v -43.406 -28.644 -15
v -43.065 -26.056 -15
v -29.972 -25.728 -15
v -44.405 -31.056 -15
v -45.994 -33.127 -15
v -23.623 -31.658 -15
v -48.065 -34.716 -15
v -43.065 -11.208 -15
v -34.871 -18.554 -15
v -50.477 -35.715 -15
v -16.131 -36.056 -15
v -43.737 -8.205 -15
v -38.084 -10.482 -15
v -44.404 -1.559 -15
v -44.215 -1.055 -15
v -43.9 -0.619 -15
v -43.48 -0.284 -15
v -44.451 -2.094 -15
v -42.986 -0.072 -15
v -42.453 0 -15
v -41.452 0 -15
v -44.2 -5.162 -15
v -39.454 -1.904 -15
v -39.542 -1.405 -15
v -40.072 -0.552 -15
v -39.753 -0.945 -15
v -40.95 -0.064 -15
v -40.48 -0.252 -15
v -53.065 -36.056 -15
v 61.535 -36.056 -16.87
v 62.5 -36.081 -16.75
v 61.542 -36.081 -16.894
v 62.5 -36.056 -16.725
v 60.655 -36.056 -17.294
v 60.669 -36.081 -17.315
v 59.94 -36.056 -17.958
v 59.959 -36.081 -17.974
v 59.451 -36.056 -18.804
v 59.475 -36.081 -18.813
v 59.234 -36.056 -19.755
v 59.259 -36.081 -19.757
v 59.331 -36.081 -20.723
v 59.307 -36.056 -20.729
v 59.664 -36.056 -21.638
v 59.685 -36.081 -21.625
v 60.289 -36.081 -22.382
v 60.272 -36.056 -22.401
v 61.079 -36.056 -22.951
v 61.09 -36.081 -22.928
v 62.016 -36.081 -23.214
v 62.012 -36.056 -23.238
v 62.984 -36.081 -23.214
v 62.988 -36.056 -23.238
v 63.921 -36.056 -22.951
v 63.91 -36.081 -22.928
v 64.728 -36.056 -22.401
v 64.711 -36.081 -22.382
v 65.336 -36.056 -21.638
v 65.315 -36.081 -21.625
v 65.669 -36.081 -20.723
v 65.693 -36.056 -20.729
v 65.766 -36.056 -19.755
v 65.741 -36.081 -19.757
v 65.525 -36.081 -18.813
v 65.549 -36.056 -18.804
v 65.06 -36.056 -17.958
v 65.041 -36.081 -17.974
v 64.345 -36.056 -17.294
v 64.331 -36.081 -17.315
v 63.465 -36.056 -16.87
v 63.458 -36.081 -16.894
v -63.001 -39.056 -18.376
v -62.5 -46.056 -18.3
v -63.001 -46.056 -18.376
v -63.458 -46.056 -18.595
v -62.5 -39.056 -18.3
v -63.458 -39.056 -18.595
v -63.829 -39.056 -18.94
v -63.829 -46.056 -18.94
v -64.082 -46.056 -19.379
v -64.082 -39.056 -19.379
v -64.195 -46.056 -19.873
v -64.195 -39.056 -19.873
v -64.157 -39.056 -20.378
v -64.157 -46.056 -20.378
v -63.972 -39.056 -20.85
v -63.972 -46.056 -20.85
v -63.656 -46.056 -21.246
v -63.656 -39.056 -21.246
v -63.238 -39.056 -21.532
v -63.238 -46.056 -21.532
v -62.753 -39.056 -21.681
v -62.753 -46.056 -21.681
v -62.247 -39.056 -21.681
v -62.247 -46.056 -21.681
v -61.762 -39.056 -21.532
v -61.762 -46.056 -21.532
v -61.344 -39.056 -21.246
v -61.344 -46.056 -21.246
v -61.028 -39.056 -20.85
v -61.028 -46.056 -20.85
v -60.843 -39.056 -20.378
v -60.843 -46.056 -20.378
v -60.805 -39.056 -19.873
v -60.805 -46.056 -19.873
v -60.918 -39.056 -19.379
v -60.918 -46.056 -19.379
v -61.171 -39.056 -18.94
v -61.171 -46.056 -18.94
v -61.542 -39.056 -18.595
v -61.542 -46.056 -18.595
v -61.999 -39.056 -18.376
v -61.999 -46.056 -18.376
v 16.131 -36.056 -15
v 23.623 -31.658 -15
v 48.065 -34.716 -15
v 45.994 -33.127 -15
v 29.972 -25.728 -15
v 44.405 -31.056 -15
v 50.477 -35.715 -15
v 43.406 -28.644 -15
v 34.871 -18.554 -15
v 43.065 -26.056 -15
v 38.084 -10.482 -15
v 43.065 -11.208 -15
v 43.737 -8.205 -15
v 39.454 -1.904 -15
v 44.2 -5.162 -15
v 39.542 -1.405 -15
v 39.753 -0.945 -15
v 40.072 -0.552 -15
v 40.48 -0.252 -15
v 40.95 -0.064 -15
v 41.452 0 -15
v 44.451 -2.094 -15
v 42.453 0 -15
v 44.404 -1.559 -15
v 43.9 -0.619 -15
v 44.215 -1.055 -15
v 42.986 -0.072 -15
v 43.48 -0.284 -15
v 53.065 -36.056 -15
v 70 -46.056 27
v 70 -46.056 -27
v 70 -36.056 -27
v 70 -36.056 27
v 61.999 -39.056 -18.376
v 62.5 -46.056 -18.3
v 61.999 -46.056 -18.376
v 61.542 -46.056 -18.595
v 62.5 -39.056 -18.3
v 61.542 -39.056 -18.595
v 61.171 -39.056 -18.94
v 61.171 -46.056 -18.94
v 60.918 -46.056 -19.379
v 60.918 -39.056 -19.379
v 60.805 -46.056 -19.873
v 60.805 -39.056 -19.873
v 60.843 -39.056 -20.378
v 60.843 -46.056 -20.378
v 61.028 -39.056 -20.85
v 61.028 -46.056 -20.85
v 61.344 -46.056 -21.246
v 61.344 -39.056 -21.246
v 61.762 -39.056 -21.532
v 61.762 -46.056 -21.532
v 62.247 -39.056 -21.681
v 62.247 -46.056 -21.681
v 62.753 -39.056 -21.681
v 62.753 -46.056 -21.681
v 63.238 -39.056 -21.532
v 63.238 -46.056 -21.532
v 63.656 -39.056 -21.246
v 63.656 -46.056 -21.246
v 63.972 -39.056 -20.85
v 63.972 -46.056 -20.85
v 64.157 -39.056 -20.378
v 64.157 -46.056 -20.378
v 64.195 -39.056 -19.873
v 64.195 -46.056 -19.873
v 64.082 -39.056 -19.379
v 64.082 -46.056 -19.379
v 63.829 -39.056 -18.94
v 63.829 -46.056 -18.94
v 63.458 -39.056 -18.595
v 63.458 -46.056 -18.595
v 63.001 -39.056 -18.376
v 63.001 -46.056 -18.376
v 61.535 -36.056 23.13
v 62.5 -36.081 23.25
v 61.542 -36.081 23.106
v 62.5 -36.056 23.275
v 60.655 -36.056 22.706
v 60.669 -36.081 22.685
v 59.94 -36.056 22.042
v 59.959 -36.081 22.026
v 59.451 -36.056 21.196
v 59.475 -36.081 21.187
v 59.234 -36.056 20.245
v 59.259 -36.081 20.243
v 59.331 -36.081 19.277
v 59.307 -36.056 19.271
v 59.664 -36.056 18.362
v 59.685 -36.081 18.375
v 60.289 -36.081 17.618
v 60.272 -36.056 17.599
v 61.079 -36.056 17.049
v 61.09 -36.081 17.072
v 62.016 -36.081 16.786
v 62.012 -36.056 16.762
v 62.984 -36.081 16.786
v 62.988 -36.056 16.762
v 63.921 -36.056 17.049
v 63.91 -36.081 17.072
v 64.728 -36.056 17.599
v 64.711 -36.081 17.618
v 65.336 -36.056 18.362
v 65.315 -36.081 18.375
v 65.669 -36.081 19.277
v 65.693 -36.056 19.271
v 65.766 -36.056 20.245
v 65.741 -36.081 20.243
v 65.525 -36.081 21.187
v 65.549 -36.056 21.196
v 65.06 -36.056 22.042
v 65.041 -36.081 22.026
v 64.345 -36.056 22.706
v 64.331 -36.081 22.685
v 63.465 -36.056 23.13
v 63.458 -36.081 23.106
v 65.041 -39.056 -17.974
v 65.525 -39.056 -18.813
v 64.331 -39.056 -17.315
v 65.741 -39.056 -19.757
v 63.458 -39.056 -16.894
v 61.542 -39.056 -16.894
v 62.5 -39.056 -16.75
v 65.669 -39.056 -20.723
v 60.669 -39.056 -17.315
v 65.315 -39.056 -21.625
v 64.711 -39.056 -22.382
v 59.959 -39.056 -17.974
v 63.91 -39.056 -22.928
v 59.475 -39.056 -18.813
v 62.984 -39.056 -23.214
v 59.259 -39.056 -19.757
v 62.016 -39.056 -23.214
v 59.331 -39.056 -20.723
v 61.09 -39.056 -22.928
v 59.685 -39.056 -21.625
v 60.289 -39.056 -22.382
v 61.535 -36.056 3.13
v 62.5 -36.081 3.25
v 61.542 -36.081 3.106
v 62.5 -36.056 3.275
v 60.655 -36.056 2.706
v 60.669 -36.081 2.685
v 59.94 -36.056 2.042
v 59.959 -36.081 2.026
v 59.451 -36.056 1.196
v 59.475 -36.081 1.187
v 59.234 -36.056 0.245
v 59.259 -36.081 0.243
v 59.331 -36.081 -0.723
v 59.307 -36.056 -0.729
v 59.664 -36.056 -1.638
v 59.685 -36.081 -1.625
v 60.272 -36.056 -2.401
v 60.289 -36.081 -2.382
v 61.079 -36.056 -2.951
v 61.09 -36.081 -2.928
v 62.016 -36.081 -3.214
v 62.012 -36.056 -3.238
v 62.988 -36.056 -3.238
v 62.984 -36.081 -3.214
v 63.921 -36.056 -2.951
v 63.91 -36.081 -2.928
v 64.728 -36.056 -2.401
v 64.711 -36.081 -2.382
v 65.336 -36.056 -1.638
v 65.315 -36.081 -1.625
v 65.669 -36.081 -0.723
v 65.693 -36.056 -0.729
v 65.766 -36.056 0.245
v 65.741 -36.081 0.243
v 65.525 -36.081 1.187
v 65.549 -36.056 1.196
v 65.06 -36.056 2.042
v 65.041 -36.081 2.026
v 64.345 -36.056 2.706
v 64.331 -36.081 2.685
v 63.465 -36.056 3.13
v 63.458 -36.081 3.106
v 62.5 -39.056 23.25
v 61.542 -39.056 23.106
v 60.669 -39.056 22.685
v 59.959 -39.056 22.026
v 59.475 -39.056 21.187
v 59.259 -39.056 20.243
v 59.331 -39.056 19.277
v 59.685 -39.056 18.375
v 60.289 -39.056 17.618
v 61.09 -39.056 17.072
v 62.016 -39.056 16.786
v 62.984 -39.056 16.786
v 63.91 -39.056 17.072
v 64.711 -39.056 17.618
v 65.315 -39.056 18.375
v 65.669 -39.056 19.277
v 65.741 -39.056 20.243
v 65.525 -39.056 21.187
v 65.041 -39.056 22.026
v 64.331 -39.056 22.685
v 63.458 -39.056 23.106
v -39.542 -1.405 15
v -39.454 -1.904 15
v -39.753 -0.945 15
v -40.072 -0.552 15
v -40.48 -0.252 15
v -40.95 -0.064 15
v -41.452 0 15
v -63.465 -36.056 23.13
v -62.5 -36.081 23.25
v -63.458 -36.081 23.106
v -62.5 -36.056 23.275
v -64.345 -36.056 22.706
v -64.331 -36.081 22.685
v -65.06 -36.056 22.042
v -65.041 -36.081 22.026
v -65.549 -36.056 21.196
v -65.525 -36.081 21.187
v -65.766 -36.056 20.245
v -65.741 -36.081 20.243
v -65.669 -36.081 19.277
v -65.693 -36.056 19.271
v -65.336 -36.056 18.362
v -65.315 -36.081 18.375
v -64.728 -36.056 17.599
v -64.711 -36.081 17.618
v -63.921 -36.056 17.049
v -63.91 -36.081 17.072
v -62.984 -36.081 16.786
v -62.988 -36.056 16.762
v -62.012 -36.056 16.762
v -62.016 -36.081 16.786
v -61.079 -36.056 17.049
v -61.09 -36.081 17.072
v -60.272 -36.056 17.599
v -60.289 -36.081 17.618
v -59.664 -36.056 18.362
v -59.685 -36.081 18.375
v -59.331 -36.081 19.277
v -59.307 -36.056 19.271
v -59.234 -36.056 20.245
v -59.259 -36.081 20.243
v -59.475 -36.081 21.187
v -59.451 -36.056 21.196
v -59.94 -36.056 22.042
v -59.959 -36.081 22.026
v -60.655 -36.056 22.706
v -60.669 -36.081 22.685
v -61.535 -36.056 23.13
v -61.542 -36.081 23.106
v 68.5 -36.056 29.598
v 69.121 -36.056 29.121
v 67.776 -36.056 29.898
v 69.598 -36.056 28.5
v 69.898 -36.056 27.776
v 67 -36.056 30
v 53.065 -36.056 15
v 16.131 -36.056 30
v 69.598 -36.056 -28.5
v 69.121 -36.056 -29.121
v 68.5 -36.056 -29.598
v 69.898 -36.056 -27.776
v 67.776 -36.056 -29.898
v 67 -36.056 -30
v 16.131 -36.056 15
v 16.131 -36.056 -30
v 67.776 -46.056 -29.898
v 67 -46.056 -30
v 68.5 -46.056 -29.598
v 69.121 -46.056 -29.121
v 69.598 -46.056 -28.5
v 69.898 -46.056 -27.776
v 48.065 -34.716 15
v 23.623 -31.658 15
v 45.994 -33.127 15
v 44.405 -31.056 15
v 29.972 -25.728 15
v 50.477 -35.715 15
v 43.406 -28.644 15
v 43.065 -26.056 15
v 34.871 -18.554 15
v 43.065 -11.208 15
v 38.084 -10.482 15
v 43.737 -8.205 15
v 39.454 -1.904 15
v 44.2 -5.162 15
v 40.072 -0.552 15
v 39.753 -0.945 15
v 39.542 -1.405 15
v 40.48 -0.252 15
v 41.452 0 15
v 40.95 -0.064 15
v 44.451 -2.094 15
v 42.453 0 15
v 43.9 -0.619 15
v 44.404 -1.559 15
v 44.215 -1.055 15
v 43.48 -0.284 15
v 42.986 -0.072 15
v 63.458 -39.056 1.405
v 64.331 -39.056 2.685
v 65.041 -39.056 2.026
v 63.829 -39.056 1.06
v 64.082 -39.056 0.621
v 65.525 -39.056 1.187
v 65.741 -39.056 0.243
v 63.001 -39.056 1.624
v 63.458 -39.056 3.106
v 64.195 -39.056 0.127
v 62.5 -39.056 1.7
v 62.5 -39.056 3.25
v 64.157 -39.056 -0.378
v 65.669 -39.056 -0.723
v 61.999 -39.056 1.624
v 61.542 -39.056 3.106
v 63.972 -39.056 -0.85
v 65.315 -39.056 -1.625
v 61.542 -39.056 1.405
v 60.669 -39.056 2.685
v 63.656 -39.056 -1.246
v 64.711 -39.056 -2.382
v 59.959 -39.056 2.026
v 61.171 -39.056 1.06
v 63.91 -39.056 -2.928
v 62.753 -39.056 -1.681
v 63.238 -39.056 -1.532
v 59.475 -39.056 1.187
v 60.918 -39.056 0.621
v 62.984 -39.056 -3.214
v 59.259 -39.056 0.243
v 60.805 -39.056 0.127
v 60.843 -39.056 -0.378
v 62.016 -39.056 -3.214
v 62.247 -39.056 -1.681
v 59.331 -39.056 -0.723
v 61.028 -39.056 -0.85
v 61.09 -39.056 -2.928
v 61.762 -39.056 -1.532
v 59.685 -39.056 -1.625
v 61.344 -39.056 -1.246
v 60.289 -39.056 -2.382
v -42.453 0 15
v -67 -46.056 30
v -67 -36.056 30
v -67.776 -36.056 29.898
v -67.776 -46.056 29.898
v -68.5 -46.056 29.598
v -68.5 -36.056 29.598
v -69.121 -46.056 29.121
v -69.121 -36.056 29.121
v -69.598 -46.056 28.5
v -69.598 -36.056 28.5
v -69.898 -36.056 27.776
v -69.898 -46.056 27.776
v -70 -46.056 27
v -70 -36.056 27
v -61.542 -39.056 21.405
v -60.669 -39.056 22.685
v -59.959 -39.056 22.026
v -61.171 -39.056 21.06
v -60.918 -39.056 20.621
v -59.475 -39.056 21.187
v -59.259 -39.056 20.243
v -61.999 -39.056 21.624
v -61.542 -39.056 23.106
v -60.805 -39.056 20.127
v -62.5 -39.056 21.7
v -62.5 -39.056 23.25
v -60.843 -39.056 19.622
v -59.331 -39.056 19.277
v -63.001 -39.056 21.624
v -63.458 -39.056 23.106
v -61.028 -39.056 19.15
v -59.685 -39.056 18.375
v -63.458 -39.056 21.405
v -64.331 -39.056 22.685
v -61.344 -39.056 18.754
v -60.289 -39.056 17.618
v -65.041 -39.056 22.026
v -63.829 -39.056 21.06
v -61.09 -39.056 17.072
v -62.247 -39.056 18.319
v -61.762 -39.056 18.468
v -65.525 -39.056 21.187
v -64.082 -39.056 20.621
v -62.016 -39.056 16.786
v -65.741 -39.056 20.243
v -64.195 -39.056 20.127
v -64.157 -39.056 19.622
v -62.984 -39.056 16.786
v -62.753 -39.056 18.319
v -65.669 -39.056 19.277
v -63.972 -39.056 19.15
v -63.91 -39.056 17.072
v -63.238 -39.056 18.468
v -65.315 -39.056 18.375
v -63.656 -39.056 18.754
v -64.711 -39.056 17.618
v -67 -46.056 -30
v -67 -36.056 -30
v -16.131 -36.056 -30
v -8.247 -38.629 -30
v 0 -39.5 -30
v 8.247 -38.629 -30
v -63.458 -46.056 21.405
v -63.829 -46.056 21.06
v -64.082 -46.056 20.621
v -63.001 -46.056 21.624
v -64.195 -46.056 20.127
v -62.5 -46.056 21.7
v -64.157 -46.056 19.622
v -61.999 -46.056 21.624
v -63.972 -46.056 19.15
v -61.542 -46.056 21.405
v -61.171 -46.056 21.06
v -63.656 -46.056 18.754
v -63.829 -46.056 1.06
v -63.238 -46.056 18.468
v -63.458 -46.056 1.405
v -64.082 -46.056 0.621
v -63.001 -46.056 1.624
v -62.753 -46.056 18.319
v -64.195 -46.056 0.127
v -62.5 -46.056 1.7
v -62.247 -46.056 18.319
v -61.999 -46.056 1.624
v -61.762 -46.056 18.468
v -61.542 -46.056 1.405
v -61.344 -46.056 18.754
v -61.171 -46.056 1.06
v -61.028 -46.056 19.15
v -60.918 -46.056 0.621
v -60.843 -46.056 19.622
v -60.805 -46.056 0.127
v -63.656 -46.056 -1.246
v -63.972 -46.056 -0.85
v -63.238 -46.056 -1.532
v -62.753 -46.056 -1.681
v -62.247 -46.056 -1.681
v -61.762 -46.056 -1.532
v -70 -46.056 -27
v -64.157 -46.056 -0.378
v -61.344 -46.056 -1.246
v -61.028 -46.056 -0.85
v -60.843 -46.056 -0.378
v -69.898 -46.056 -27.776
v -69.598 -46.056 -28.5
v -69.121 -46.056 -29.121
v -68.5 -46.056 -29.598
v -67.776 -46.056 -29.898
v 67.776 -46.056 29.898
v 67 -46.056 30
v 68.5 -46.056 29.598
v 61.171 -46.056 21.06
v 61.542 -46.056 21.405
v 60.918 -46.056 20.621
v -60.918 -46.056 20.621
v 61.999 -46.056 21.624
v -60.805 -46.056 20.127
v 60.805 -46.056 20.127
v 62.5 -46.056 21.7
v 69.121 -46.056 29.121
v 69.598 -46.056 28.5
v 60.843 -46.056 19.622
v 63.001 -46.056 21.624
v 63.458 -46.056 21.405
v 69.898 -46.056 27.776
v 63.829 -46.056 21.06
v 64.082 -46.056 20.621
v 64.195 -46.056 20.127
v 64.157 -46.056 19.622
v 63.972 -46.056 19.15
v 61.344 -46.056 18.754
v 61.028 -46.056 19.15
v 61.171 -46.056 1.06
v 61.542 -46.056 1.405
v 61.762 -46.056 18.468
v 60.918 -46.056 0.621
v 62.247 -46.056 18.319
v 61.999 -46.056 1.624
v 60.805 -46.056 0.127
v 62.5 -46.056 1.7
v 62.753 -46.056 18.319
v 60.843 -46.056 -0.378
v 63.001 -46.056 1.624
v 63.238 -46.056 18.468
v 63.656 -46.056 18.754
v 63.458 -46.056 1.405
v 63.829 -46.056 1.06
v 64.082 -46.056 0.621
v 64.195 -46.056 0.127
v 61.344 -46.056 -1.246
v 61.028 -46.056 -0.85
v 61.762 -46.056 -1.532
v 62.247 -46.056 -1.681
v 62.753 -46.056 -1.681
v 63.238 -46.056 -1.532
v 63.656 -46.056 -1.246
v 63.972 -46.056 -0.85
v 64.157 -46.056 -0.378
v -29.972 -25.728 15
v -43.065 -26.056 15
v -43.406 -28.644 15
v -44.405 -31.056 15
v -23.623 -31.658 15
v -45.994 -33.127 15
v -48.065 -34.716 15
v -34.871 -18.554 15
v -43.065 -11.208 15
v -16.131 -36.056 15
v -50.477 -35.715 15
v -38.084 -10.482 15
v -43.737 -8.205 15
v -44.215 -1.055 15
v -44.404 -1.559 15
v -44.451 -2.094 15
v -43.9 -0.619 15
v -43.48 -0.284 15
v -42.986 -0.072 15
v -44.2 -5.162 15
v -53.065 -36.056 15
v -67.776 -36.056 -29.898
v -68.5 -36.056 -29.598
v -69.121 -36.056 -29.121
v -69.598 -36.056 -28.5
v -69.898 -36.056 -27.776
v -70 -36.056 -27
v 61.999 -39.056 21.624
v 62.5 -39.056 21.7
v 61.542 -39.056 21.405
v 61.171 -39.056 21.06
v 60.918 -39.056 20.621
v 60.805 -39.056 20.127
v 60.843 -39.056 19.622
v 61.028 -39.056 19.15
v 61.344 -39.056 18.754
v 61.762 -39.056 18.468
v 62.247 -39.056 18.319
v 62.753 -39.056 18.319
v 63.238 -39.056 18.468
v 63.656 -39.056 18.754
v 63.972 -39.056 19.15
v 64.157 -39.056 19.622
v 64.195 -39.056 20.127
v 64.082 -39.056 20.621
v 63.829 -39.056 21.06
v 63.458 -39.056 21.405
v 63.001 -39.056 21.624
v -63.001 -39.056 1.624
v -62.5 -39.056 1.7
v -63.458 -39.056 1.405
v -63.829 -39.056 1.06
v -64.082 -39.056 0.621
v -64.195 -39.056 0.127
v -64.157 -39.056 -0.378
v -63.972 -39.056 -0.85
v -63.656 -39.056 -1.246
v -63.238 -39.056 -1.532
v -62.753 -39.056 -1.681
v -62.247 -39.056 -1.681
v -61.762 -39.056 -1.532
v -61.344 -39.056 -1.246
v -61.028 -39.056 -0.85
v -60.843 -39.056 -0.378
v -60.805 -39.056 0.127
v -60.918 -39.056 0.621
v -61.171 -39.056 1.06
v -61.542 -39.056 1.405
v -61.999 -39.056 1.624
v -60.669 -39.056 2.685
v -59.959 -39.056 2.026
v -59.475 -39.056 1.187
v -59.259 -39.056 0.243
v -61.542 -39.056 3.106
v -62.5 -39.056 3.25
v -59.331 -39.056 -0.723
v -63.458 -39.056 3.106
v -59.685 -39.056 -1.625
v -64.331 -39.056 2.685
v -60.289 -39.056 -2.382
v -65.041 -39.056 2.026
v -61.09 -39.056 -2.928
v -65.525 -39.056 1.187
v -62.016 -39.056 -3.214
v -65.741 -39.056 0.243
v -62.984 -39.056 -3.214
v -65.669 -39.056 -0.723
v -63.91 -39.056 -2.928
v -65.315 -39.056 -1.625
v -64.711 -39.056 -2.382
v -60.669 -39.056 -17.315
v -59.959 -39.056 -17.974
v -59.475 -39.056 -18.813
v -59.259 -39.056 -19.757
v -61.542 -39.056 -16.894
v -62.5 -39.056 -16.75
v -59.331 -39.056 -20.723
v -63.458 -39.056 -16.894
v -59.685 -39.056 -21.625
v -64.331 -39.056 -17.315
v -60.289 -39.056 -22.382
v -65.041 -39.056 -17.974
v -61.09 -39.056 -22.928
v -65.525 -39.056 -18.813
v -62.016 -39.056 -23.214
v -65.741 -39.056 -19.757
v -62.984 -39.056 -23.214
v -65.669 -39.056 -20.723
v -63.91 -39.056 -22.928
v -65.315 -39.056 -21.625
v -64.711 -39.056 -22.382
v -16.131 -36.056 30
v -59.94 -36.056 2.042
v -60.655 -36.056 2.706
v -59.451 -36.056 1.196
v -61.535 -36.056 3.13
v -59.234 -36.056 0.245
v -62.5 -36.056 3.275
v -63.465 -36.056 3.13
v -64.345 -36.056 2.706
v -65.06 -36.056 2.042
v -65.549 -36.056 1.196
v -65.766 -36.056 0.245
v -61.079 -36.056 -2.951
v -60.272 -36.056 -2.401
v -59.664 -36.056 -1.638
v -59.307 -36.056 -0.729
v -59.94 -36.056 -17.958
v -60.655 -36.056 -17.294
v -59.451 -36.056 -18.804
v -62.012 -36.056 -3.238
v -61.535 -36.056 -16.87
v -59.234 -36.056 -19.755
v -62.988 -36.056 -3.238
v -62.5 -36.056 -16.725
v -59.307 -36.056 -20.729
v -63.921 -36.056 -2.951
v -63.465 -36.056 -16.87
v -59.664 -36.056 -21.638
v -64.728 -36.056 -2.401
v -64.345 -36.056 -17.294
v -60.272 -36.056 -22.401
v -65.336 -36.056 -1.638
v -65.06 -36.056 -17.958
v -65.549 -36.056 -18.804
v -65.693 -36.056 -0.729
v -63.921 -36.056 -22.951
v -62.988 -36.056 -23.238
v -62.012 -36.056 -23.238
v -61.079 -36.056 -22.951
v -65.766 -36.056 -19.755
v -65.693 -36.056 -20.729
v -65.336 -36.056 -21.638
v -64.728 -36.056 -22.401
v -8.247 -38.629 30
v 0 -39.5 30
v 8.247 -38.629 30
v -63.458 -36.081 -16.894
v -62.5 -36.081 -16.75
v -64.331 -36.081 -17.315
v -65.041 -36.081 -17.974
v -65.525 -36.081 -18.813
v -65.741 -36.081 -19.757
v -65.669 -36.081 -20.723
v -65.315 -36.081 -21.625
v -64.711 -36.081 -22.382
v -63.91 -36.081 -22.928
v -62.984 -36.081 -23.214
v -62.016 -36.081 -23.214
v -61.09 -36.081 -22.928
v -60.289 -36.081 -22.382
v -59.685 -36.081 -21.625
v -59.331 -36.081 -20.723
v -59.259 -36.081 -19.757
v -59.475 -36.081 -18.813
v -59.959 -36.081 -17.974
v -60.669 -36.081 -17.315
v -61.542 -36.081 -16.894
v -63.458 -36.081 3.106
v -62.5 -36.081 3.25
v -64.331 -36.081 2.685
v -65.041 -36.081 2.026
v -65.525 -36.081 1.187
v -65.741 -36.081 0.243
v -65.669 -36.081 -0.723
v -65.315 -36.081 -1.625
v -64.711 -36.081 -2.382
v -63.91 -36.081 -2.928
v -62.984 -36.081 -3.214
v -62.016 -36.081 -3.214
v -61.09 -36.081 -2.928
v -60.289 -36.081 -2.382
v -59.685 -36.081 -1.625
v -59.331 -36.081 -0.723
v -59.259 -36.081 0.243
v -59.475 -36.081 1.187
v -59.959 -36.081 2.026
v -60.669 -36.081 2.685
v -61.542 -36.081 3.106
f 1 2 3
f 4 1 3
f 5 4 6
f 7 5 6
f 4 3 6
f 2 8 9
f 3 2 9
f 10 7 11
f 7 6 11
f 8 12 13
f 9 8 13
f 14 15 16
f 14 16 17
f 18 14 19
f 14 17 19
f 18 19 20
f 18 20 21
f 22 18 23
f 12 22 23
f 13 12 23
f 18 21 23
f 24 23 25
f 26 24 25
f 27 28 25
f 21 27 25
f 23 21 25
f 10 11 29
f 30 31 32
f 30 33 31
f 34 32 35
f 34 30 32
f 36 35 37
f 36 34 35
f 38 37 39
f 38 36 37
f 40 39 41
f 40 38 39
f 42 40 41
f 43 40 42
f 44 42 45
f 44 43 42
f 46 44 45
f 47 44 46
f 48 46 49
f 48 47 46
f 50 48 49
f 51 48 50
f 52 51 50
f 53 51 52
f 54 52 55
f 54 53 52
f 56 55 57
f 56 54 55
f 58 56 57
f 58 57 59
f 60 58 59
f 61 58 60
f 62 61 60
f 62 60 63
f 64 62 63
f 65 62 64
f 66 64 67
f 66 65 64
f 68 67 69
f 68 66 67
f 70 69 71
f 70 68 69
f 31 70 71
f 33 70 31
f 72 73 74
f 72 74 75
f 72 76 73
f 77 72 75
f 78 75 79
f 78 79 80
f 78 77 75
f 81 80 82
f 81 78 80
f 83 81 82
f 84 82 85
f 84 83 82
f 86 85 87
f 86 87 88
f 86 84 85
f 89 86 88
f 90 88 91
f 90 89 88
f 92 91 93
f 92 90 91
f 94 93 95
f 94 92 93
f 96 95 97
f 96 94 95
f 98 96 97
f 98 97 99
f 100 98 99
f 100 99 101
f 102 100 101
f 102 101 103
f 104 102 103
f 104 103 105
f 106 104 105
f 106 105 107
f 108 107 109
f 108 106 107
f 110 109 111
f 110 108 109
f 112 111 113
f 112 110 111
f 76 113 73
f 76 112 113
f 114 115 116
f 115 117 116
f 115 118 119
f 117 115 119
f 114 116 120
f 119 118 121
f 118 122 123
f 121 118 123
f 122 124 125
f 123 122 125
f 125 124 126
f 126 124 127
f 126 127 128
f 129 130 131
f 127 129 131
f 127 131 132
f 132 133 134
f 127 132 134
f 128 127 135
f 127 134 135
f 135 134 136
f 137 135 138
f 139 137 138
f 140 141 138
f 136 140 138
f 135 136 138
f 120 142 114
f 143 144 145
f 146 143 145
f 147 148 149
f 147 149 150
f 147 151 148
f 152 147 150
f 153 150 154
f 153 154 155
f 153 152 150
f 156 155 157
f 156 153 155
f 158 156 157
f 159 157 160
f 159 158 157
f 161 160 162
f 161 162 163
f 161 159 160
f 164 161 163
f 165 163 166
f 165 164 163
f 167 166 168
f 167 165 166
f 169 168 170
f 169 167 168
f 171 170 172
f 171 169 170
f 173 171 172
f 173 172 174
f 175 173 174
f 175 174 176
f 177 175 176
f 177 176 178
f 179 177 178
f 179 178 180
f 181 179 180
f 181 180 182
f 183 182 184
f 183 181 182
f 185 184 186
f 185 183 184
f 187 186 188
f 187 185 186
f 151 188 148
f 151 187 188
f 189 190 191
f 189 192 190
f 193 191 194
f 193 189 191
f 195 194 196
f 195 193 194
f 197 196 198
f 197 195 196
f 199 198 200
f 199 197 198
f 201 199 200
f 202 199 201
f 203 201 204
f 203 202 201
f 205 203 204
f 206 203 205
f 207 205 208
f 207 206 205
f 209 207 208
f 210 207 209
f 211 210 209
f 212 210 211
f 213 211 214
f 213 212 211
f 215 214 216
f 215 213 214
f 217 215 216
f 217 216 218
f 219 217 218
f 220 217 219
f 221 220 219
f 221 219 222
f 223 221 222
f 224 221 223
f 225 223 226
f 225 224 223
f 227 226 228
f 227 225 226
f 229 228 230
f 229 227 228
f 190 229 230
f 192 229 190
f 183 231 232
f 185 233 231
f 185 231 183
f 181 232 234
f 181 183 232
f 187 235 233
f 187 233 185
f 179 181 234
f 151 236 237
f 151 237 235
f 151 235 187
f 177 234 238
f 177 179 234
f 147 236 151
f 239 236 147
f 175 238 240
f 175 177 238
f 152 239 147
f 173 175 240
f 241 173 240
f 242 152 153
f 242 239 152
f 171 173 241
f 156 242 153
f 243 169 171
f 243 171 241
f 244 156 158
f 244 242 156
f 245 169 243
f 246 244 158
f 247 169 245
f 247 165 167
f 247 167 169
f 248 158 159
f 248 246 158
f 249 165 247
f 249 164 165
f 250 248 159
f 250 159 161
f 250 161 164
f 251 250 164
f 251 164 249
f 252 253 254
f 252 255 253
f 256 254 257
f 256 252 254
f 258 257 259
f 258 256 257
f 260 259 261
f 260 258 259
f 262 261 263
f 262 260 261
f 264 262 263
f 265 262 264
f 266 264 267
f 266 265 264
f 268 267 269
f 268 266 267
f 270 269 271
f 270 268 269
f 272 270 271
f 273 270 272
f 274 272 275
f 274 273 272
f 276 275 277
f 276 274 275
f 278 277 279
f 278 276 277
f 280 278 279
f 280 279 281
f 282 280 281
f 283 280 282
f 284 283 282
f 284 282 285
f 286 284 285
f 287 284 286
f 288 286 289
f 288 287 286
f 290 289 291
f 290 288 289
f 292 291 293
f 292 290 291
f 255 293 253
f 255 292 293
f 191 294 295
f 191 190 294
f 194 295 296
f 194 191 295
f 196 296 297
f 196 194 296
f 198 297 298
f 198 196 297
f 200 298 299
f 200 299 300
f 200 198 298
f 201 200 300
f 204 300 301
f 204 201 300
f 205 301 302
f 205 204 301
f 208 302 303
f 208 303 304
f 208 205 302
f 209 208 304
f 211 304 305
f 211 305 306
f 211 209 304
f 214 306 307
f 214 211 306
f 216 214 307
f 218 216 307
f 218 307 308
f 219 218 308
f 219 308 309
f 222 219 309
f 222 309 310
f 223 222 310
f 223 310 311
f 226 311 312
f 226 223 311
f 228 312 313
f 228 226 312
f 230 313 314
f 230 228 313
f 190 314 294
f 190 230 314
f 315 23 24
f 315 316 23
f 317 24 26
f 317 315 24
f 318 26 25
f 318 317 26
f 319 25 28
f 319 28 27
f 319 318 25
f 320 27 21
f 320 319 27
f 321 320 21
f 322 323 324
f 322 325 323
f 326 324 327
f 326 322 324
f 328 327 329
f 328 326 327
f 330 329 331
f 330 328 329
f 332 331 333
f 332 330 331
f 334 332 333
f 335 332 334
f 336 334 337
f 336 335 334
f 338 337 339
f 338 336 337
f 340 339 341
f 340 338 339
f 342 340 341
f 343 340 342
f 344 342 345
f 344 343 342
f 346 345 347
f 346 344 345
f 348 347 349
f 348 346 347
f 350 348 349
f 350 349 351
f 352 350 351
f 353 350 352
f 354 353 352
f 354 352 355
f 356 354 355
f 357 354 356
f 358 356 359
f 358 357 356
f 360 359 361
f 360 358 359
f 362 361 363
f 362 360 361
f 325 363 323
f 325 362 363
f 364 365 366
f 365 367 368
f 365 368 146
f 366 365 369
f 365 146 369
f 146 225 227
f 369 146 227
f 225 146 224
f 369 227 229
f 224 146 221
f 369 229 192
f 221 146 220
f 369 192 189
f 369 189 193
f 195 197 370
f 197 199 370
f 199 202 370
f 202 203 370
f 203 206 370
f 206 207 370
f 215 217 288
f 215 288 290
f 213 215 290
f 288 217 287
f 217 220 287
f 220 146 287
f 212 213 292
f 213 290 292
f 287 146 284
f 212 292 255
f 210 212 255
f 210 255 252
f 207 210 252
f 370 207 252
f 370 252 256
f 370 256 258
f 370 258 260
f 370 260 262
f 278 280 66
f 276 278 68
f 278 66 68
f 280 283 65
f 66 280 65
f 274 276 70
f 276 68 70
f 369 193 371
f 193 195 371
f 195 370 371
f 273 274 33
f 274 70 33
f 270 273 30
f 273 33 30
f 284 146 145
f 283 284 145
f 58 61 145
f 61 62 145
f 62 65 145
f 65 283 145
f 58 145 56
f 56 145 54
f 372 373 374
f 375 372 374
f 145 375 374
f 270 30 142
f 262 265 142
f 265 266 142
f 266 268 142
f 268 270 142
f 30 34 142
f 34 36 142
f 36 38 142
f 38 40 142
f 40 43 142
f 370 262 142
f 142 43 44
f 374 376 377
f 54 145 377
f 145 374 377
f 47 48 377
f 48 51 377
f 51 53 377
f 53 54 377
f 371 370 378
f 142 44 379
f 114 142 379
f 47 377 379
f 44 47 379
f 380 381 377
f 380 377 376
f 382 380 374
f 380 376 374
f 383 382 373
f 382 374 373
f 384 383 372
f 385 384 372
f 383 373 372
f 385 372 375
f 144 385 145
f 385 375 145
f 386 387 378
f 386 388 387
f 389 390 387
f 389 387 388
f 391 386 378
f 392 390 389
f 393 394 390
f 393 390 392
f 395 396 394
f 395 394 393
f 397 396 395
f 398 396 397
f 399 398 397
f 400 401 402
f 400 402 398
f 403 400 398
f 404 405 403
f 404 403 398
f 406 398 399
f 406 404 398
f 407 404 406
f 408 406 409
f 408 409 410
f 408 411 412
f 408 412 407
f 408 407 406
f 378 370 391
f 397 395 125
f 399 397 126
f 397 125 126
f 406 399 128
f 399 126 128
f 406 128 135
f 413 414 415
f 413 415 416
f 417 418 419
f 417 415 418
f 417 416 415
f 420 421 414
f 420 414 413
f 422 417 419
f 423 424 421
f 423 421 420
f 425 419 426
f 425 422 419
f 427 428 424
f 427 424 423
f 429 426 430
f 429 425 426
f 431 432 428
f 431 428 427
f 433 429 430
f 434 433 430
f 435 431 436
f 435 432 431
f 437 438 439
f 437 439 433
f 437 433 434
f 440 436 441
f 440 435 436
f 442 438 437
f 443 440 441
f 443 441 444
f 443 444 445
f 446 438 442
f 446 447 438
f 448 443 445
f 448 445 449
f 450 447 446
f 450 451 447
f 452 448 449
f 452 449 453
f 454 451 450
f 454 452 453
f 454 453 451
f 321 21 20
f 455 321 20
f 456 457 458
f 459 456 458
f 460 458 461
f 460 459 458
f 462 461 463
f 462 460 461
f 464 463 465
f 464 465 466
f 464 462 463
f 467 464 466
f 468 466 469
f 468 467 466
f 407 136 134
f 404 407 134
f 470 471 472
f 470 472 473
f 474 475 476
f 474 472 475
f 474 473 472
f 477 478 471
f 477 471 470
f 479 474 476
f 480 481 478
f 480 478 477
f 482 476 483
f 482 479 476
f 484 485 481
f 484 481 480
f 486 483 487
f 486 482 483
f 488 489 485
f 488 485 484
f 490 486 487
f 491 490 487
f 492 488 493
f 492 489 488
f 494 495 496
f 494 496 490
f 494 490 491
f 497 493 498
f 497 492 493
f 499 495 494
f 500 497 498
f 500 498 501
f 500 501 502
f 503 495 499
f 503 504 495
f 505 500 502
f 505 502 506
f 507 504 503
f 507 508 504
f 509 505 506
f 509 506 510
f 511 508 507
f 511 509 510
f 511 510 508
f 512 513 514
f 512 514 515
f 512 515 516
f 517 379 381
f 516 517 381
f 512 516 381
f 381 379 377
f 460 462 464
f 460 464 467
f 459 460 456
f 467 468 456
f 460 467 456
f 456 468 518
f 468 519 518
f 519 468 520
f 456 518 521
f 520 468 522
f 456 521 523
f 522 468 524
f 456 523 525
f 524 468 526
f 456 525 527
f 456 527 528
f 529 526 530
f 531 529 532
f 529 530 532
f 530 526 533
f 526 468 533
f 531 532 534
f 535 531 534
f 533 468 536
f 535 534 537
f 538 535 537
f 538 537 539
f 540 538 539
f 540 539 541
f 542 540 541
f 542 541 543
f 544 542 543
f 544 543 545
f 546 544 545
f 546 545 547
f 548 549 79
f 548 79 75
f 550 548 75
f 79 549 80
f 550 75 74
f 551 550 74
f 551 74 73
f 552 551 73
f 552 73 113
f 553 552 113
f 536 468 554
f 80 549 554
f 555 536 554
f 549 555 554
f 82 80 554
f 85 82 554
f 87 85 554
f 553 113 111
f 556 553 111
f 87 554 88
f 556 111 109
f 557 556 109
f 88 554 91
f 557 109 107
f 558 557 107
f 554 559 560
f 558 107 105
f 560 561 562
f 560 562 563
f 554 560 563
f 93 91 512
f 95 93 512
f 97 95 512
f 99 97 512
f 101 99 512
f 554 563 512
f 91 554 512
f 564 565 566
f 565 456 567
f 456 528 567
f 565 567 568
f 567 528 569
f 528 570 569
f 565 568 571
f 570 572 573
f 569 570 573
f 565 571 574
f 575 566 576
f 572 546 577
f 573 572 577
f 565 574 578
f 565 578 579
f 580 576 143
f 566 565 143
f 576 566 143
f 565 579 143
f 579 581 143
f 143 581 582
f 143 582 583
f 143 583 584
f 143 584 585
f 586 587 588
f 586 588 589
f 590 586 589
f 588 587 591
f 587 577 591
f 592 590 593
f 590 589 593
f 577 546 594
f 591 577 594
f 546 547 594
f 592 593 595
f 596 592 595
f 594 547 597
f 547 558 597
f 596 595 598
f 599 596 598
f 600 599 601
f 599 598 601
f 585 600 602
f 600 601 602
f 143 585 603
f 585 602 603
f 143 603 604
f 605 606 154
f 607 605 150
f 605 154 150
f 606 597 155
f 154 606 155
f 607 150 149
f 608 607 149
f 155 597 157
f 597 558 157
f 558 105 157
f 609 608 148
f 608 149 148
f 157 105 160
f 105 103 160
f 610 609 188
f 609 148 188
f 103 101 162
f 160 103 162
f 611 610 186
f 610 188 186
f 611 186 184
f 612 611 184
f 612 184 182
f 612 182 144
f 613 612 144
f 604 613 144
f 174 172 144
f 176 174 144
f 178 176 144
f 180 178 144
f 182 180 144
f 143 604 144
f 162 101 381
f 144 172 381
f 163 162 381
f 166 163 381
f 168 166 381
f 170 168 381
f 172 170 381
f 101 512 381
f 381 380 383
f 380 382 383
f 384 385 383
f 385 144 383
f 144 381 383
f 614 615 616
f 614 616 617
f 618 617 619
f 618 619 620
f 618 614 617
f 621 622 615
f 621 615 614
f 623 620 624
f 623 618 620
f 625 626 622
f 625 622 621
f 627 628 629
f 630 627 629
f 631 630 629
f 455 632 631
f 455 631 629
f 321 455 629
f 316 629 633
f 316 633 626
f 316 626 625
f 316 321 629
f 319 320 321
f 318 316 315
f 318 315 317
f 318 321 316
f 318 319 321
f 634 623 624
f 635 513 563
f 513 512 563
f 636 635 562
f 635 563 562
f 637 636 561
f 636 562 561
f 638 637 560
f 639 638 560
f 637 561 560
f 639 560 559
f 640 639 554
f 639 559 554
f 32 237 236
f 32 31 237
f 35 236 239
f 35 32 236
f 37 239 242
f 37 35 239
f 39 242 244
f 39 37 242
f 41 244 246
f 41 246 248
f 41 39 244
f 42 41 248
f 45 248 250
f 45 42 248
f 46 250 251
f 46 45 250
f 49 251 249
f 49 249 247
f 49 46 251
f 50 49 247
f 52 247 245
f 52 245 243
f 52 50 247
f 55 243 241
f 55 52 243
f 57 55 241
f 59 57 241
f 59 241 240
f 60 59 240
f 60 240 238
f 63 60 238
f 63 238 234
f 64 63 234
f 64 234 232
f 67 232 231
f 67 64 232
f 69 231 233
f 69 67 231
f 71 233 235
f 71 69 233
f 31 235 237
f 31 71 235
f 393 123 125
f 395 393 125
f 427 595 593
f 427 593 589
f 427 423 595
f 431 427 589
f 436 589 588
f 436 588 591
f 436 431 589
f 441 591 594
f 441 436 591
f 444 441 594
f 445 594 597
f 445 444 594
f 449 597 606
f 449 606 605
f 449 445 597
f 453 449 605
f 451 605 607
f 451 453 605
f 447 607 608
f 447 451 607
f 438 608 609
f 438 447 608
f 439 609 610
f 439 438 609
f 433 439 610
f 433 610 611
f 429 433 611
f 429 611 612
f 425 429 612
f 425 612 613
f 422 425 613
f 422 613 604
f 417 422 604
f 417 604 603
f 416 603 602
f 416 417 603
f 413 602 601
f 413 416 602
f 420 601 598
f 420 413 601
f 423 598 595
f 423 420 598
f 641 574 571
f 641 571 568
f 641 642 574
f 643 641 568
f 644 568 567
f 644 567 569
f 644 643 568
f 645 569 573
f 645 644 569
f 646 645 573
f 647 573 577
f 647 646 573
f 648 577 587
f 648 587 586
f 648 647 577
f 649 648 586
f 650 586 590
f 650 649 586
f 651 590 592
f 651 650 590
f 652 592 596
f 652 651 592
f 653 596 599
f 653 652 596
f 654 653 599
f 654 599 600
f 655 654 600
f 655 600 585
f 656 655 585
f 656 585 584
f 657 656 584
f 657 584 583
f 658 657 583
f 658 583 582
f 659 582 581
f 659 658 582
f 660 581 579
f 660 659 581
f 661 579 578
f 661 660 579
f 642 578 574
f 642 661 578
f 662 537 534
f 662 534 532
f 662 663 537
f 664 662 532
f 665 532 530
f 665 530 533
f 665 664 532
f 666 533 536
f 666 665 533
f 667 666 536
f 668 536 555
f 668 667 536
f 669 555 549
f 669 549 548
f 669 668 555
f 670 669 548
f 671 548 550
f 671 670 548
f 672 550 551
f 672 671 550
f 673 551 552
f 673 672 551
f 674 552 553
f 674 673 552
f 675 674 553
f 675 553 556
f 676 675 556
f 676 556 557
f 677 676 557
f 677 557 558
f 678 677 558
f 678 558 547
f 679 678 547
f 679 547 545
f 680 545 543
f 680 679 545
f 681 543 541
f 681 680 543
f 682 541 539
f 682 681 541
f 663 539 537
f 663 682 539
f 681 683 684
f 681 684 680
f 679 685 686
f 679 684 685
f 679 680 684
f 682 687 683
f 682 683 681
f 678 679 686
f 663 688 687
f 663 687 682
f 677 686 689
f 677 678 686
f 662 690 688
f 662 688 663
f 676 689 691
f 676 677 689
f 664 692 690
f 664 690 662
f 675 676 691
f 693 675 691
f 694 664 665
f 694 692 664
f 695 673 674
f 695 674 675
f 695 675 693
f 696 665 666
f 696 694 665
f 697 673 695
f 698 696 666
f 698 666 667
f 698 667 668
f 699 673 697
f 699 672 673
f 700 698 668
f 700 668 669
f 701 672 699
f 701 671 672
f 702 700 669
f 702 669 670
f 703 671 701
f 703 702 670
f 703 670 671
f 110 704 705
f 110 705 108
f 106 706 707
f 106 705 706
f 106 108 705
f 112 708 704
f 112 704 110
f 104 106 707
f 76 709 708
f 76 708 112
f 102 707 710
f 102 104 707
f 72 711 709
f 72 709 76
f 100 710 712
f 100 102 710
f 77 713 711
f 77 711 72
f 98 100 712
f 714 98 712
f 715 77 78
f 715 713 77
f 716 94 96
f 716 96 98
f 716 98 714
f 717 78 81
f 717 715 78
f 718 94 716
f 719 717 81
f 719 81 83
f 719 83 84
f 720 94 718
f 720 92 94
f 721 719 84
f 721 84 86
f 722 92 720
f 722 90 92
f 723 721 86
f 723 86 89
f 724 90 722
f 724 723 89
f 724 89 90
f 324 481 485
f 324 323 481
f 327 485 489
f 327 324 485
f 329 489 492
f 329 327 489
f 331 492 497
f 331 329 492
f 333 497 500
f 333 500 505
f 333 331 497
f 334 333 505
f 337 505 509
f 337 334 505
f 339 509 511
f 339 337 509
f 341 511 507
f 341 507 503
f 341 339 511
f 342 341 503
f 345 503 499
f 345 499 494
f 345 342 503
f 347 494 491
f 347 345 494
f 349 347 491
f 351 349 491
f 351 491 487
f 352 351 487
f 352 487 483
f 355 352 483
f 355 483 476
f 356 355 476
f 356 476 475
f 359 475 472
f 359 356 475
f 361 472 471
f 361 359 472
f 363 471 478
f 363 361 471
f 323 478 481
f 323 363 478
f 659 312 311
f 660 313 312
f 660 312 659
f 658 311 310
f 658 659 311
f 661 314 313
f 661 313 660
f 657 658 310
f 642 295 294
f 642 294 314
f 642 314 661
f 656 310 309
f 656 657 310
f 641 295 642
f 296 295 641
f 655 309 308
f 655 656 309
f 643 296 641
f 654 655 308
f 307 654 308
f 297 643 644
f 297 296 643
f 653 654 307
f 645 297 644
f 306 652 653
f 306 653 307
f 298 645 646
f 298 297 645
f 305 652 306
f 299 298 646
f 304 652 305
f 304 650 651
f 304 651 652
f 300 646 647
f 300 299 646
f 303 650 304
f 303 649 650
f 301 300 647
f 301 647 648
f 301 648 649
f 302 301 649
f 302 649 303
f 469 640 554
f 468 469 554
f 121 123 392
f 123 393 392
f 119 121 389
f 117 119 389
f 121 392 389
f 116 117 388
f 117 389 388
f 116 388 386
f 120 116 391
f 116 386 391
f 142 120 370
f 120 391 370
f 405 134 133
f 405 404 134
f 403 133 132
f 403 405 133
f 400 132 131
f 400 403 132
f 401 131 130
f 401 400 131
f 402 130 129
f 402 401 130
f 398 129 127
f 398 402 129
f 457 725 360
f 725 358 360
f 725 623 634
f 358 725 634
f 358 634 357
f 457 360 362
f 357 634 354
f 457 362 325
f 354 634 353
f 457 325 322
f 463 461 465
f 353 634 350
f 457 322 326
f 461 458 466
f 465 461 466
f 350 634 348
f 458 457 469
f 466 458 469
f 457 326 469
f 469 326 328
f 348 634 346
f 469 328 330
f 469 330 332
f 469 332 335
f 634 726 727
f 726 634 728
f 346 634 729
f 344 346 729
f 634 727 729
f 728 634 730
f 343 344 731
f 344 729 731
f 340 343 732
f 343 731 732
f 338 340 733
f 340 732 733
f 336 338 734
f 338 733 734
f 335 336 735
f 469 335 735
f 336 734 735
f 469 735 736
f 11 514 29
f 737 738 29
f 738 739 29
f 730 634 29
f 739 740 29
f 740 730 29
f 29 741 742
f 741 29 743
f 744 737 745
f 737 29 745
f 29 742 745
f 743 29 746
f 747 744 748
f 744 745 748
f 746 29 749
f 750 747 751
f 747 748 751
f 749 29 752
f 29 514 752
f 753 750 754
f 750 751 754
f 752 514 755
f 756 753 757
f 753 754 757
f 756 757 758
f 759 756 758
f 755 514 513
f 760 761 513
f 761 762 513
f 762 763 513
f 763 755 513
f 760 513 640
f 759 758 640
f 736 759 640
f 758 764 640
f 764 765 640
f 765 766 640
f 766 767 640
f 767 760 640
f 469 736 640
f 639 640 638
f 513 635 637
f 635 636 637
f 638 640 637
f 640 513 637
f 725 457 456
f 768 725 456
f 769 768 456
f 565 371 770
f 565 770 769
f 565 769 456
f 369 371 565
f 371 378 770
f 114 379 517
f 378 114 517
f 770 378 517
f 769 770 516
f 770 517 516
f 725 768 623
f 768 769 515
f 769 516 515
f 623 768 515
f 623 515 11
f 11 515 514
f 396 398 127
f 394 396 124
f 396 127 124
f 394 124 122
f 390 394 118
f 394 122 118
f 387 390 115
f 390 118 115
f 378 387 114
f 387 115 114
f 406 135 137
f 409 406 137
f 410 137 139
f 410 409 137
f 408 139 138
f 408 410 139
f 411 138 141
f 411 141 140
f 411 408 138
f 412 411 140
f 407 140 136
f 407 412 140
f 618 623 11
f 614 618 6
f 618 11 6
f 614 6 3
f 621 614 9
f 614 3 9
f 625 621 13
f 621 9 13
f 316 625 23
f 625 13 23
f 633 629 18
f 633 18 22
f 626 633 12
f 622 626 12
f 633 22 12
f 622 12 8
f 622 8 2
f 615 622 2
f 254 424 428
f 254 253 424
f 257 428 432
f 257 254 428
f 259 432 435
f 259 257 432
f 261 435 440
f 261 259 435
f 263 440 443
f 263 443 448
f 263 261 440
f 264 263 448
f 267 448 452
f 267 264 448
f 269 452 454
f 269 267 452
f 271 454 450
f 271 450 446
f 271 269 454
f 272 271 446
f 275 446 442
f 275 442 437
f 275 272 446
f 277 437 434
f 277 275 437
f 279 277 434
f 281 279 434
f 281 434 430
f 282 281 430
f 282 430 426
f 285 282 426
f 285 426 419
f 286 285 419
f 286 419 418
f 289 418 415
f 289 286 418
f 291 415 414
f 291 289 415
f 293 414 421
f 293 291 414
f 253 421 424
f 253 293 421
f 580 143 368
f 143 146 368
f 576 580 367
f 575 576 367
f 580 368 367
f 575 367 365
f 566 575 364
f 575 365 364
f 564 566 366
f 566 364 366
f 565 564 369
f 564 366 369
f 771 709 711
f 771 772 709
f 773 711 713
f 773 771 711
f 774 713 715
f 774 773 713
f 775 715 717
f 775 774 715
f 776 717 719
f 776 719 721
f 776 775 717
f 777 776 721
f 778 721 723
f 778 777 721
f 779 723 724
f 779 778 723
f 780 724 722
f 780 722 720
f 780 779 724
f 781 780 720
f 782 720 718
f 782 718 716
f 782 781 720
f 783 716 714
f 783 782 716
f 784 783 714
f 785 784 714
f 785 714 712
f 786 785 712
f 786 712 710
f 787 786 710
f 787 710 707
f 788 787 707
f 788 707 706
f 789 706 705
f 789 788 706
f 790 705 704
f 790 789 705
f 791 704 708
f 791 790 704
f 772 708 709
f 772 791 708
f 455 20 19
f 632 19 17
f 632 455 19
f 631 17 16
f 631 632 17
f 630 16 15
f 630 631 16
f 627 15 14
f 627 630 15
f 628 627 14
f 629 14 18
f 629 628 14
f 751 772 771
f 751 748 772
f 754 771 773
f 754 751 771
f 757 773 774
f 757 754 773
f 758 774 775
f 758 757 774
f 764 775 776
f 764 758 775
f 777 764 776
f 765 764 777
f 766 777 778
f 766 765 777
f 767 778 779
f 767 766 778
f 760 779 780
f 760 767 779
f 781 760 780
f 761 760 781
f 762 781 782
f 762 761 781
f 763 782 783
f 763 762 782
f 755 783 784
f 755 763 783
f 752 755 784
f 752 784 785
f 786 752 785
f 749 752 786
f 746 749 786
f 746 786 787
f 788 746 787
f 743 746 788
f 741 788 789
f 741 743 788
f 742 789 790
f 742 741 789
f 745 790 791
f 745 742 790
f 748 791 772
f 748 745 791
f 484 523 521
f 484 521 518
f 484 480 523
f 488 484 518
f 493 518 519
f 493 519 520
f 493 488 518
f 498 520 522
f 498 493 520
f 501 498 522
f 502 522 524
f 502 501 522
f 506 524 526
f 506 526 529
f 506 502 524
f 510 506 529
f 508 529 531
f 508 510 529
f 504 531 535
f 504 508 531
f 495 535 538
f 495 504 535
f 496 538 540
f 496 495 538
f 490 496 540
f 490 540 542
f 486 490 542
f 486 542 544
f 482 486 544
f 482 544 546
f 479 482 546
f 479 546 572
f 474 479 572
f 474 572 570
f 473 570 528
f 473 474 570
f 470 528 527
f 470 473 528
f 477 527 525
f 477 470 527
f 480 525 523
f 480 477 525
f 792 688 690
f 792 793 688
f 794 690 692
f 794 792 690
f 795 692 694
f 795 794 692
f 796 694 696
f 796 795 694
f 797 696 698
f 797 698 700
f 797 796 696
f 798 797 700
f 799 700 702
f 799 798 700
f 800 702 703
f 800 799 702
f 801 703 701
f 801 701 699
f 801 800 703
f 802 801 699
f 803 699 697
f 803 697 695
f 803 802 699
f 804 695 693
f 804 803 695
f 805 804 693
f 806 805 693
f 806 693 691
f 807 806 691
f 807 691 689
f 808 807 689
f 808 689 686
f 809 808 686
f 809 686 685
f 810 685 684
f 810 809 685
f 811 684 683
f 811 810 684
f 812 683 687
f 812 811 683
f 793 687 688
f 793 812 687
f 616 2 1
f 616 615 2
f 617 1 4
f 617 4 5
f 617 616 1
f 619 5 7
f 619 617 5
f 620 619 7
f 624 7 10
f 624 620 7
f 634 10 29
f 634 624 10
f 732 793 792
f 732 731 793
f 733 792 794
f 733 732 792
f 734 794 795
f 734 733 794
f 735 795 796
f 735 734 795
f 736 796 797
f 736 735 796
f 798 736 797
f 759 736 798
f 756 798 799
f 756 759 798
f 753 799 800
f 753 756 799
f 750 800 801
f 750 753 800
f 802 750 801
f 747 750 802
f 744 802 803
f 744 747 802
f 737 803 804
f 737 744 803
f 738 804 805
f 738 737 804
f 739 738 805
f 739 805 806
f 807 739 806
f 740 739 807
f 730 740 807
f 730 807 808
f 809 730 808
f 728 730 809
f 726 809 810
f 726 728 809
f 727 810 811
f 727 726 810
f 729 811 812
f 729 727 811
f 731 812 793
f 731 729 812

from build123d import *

# Parameters (mm, degrees)
BOSS_EXTRUDE3_DEPTH           = 30
BOSS_EXTRUDE3_DEPTH_BACK      = 30
BOSS_EXTRUDE4_DEPTH           = 15
BOSS_EXTRUDE4_DEPTH_BACK      = 15
BOSS_EXTRUDE5_DEPTH           = 15
BOSS_EXTRUDE5_DEPTH_BACK      = 15
FILLET1_R                     = 10
CBORE_FOR_M3_SHCS1_AT_2_COUNT = 2
CBORE_FOR_M3_SHCS1_AT_2_PITCH = 125
LPATTERN1_COUNT               = 2
LPATTERN1_PITCH               = 20
LPATTERN1_COL_COUNT           = 2
LPATTERN1_COL_PITCH           = 20
FILLET2_R                     = 2
FILLET3_R                     = 3


with BuildPart() as part:
    # Sketch1 → Boss-Extrude3 (new, two sides: drawn at the far end of the back side and taken through both)
    with BuildSketch(Plane.XY.offset(-BOSS_EXTRUDE3_DEPTH_BACK)):
        with BuildLine():
            Line((-43.065388601, -36.056178761), (-70, -36.056178761))
            Line((-70, -36.056178761), (-70, -46.056178761))
            Line((-70, -46.056178761), (70, -46.056178761))
            Line((70, -46.056178761), (70, -36.056178761))
            Line((70, -36.056178761), (43.065388601, -36.056178761))
            Line((43.065388601, -36.056178761), (26.080681992, -36.056178761))
            Line((26.080681992, -36.056178761), (16.130777202, -36.056178761))
            ThreePointArc((16.130777202, -36.056178761), (0, -39.5), (-16.130777202, -36.056178761))
            Line((-16.130777202, -36.056178761), (-26.080681992, -36.056178761))
            Line((-26.080681992, -36.056178761), (-43.065388601, -36.056178761))
        make_face()
    extrude(amount=BOSS_EXTRUDE3_DEPTH + BOSS_EXTRUDE3_DEPTH_BACK)

    # Sketch1<6> → Boss-Extrude4 (add, two sides: drawn at the far end of the back side and taken through both)
    with BuildSketch(Plane.XY.offset(-BOSS_EXTRUDE4_DEPTH_BACK)):
        with BuildLine():
            ThreePointArc((-44.5, 0), (-39.628527279, -20.24425414), (-26.080681992, -36.056178761))
            Line((-26.080681992, -36.056178761), (-16.130777202, -36.056178761))
            ThreePointArc((-16.130777202, -36.056178761), (-33.146762281, -21.483532071), (-39.5, 0))
            Line((-39.5, 0), (-44.5, 0))
        make_face()
        with BuildLine():
            ThreePointArc((39.5, 0), (33.146762281, -21.483532071), (16.130777202, -36.056178761))
            Line((16.130777202, -36.056178761), (26.080681992, -36.056178761))
            ThreePointArc((26.080681992, -36.056178761), (39.628527279, -20.24425414), (44.5, 0))
            Line((44.5, 0), (39.5, 0))
        make_face()
    extrude(amount=BOSS_EXTRUDE4_DEPTH + BOSS_EXTRUDE4_DEPTH_BACK)

    # Sketch1<7> → Boss-Extrude5 (add, two sides: drawn at the far end of the back side and taken through both)
    with BuildSketch(Plane.XY.offset(-BOSS_EXTRUDE5_DEPTH_BACK)):
        with BuildLine():
            Line((-43.065388601, -11.208135645), (-43.065388601, -36.056178761))
            Line((-43.065388601, -36.056178761), (-26.080681992, -36.056178761))
            ThreePointArc((-26.080681992, -36.056178761), (-36.737597653, -25.111728708), (-43.065388601, -11.208135645))
        make_face()
        with BuildLine():
            Line((26.080681992, -36.056178761), (43.065388601, -36.056178761))
            Line((43.065388601, -36.056178761), (43.065388601, -11.208135645))
            ThreePointArc((43.065388601, -11.208135645), (36.737597653, -25.111728708), (26.080681992, -36.056178761))
        make_face()
    extrude(amount=BOSS_EXTRUDE5_DEPTH + BOSS_EXTRUDE5_DEPTH_BACK)

    # Fillet1
    fillet1_edges = [part.edges().sort_by_distance(p)[0] for p in [
        (43.065388601, -36.056178761, 0),
        (-43.065388601, -36.056178761, 0),
    ]]
    fillet(fillet1_edges, radius=FILLET1_R)

    # Sketch4 → CBORE for M3 SHCS1 (revolve, cut)
    with BuildSketch(Plane(origin=(-62.5, -36.056178761, 0), x_dir=(0, 0, 1), z_dir=(1, 0, 0))):
        Polygon((0, 0), (0, 10), (1.7, 10), (1.7, 3), (3.25, 3), (3.25, 0.025), (3.275, 0), align=None)
    cbore_for_m3_shcs1 = revolve(axis=Axis((-62.5, -29.706178761, 0), (0, -1, 0)), mode=Mode.SUBTRACT)

    # CBORE for M3 SHCS1 at 2: CBORE for M3 SHCS1 ×2
    with Locations(*[(i * CBORE_FOR_M3_SHCS1_AT_2_PITCH, 0, 0) for i in range(1, CBORE_FOR_M3_SHCS1_AT_2_COUNT)]):
        add(cbore_for_m3_shcs1, mode=Mode.SUBTRACT)

    # LPattern1: CBORE for M3 SHCS1 ×2
    with Locations(*[(0, 0, -i * LPATTERN1_PITCH) for i in range(1, LPATTERN1_COUNT)]):
        add(cbore_for_m3_shcs1, mode=Mode.SUBTRACT)

    # LPattern1 copy 1 sketch → LPattern1 copy 1 (revolve, cut)
    with BuildSketch(Plane(origin=(62.5, -36.056178761, -20), x_dir=(0, 0, 1), z_dir=(1, 0, 0))):
        Polygon((0, 0), (0, 10), (1.7, 10), (1.7, 3), (3.25, 3), (3.25, 0.025), (3.275, 0), align=None)
    revolve(axis=Axis((62.5, -29.706178761, -20), (0, -1, 0)), mode=Mode.SUBTRACT)

    # LPattern1 col: CBORE for M3 SHCS1 ×2
    with Locations(*[(0, 0, i * LPATTERN1_COL_PITCH) for i in range(1, LPATTERN1_COL_COUNT)]):
        add(cbore_for_m3_shcs1, mode=Mode.SUBTRACT)

    # LPattern1 col copy 1 sketch → LPattern1 col copy 1 (revolve, cut)
    with BuildSketch(Plane(origin=(62.5, -36.056178761, 20), x_dir=(0, 0, 1), z_dir=(1, 0, 0))):
        Polygon((0, 0), (0, 10), (1.7, 10), (1.7, 3), (3.25, 3), (3.25, 0.025), (3.275, 0), align=None)
    revolve(axis=Axis((62.5, -29.706178761, 20), (0, -1, 0)), mode=Mode.SUBTRACT)

    # Fillet2
    fillet2_edges = [part.edges().sort_by_distance(p)[0] for p in [
        (-44.5, 0, 0),
        (-39.5, 0, 0),
        (44.5, 0, 0),
        (39.5, 0, 0),
    ]]
    fillet(fillet2_edges, radius=FILLET2_R)

    # Fillet3
    fillet3_edges = [part.edges().sort_by_distance(p)[0] for p in [
        (-70, -41.056178761, 30),
        (-70, -41.056178761, -30),
        (70, -41.056178761, -30),
        (70, -41.056178761, 30),
    ]]
    fillet(fillet3_edges, radius=FILLET3_R)


solid = part.part
